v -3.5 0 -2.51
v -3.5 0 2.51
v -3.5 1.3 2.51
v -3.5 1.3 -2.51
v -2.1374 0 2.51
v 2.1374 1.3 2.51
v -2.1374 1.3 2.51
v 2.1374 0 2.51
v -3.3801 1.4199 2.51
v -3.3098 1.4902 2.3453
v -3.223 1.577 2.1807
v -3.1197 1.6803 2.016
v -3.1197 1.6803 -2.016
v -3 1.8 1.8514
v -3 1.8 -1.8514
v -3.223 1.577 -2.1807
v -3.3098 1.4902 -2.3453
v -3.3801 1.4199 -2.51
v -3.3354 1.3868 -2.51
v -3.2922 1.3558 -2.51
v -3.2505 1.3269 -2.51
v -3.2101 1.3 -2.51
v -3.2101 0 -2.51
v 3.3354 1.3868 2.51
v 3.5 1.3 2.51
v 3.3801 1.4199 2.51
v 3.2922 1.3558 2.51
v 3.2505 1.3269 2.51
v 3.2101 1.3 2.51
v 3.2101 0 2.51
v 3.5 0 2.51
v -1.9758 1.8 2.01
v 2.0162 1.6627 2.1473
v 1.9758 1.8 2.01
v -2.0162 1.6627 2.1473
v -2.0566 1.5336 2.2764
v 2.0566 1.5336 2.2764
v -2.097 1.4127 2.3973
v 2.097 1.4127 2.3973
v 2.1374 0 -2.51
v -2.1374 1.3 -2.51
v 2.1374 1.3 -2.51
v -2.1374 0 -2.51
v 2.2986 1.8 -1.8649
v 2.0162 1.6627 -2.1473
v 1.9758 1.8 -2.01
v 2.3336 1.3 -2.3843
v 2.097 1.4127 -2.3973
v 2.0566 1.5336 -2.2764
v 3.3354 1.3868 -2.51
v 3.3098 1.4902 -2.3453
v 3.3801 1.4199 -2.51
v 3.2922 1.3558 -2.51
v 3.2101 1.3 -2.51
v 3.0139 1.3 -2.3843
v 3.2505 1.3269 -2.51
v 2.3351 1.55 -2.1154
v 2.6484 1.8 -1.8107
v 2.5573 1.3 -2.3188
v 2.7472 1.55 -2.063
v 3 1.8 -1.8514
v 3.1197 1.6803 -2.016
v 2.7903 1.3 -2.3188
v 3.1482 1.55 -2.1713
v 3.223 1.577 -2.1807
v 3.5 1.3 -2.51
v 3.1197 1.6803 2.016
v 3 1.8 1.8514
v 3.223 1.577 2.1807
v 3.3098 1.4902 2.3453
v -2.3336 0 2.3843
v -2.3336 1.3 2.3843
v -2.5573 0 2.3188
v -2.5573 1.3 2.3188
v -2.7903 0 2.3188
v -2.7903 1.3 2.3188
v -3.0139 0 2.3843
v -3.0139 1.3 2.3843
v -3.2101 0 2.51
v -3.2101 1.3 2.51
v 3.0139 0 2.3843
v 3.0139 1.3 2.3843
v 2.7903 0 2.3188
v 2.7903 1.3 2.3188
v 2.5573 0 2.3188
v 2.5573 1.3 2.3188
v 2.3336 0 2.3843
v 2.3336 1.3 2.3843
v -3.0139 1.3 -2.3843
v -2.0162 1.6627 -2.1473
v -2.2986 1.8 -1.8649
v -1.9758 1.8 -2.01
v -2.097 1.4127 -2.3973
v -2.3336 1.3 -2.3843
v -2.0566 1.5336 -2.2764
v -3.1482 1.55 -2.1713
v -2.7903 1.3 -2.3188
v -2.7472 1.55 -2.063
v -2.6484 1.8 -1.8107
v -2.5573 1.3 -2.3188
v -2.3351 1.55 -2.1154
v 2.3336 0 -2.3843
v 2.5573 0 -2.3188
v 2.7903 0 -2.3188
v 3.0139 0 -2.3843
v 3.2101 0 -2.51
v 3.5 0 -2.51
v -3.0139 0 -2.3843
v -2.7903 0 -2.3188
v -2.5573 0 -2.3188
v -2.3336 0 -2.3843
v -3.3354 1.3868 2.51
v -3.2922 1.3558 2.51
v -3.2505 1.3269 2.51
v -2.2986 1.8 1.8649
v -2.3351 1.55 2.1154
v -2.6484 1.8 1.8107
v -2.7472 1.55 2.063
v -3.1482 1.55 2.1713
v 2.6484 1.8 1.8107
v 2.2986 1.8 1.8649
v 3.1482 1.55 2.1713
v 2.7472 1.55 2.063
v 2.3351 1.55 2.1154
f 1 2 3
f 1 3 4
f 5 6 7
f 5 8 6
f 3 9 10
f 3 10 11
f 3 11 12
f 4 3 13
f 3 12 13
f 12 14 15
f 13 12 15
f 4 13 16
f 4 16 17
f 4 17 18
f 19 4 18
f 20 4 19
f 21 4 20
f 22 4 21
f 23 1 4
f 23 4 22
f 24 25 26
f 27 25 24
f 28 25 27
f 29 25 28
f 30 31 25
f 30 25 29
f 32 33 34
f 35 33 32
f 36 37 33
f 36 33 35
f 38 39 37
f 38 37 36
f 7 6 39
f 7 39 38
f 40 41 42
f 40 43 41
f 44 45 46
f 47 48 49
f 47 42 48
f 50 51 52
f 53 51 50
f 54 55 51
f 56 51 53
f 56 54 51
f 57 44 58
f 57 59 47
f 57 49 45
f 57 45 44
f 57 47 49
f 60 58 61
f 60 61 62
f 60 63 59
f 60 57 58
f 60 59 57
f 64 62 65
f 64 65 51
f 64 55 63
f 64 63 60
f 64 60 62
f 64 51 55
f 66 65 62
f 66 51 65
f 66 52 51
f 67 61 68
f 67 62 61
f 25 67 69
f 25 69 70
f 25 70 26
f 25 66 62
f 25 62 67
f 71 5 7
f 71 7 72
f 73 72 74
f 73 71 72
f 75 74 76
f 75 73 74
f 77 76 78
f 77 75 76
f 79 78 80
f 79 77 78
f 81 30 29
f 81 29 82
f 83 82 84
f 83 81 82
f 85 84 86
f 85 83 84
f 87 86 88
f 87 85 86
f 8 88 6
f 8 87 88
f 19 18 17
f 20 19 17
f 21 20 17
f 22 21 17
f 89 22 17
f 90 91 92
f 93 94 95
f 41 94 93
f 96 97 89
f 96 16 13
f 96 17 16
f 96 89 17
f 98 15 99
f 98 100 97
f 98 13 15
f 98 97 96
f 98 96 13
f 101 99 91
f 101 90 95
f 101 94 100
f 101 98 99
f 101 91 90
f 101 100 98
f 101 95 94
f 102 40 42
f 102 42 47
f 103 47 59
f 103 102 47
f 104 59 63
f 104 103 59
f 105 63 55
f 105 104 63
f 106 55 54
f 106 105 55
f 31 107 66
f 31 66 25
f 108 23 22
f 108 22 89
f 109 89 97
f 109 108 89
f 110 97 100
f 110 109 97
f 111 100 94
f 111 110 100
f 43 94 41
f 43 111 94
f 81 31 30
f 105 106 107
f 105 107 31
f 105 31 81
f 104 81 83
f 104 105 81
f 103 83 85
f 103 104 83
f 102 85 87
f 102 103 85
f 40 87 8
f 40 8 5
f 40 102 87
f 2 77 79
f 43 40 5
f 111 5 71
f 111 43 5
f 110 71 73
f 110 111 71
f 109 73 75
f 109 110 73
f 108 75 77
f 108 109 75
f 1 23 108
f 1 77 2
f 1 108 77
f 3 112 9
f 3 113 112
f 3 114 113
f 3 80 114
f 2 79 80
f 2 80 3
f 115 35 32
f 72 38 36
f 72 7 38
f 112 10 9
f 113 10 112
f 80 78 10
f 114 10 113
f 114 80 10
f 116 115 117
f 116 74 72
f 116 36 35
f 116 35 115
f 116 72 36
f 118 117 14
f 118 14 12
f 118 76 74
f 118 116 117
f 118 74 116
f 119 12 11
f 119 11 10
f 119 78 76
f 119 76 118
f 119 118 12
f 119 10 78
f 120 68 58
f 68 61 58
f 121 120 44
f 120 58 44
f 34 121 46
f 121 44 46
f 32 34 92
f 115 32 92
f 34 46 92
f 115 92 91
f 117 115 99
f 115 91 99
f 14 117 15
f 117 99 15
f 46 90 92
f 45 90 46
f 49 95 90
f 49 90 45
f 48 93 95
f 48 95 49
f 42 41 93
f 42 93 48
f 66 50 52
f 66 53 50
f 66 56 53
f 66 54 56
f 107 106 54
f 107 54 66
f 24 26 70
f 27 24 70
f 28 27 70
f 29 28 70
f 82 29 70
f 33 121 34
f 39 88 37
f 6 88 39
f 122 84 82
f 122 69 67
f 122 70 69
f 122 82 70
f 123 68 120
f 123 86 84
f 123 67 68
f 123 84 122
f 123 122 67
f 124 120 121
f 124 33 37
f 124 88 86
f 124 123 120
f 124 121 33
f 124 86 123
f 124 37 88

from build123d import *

# Parameters (mm, degrees)
EXTRUDE_1_DEPTH = 1.8
CHAMFER_1_SIZE  = 0.5


with BuildPart() as part:
    # Эскиз1 → Бобышка-Вытянуть1 (new body)
    with BuildSketch(Plane(origin=(0, 0, 0), x_dir=(1, 0, 0), z_dir=(0, 1, 0))):
        with BuildLine():
            Line((-3.5, 2.51), (-3.210140252, 2.51))
            ThreePointArc((-3.210140252, 2.51), (-2.673786949, 2.310468426), (-2.137433645, 2.51))
            Line((-2.137433645, 2.51), (2.137433645, 2.51))
            ThreePointArc((2.137433645, 2.51), (2.673786949, 2.310468426), (3.210140252, 2.51))
            Line((3.210140252, 2.51), (3.5, 2.51))
            Line((3.5, 2.51), (3.5, -2.51))
            Line((3.5, -2.51), (3.210140252, -2.51))
            ThreePointArc((3.210140252, -2.51), (2.673786949, -2.310468426), (2.137433645, -2.51))
            Line((2.137433645, -2.51), (-2.137433645, -2.51))
            ThreePointArc((-2.137433645, -2.51), (-2.673786949, -2.310468426), (-3.210140252, -2.51))
            Line((-3.210140252, -2.51), (-3.5, -2.51))
            Line((-3.5, -2.51), (-3.5, 2.51))
        make_face()
    extrude(amount=EXTRUDE_1_DEPTH)

    # Фаска1
    chamfer_1_edges = [part.edges().sort_by_distance(p)[0] for p in [
        (-3.5, 1.8, 0),
    ]]
    chamfer(chamfer_1_edges, length=CHAMFER_1_SIZE)
    chamfer_1_2_edges = [part.edges().sort_by_distance(p)[0] for p in [
        (3.5, 1.8, 0),
    ]]
    chamfer(chamfer_1_2_edges, length=CHAMFER_1_SIZE)
    chamfer_1_3_edges = [part.edges().sort_by_distance(p)[0] for p in [
        (-2.54973161, 1.8, 2.319899262),
    ]]
    chamfer(chamfer_1_3_edges, length=CHAMFER_1_SIZE)
    chamfer_1_4_edges = [part.edges().sort_by_distance(p)[0] for p in [
        (-2.54973161, 1.8, -2.319899262),
    ]]
    chamfer(chamfer_1_4_edges, length=CHAMFER_1_SIZE)
    chamfer_1_5_edges = [part.edges().sort_by_distance(p)[0] for p in [
        (2.54973161, 1.8, -2.319899262),
    ]]
    chamfer(chamfer_1_5_edges, length=CHAMFER_1_SIZE)
    chamfer_1_6_edges = [part.edges().sort_by_distance(p)[0] for p in [
        (2.54973161, 1.8, 2.319899262),
    ]]
    chamfer(chamfer_1_6_edges, length=CHAMFER_1_SIZE)
    chamfer_1_7_edges = [part.edges().sort_by_distance(p)[0] for p in [
        (0, 1.8, -2.51),
    ]]
    chamfer(chamfer_1_7_edges, length=CHAMFER_1_SIZE)
    chamfer_1_8_edges = [part.edges().sort_by_distance(p)[0] for p in [
        (0, 1.8, 2.51),
    ]]
    chamfer(chamfer_1_8_edges, length=CHAMFER_1_SIZE)


solid = part.part
